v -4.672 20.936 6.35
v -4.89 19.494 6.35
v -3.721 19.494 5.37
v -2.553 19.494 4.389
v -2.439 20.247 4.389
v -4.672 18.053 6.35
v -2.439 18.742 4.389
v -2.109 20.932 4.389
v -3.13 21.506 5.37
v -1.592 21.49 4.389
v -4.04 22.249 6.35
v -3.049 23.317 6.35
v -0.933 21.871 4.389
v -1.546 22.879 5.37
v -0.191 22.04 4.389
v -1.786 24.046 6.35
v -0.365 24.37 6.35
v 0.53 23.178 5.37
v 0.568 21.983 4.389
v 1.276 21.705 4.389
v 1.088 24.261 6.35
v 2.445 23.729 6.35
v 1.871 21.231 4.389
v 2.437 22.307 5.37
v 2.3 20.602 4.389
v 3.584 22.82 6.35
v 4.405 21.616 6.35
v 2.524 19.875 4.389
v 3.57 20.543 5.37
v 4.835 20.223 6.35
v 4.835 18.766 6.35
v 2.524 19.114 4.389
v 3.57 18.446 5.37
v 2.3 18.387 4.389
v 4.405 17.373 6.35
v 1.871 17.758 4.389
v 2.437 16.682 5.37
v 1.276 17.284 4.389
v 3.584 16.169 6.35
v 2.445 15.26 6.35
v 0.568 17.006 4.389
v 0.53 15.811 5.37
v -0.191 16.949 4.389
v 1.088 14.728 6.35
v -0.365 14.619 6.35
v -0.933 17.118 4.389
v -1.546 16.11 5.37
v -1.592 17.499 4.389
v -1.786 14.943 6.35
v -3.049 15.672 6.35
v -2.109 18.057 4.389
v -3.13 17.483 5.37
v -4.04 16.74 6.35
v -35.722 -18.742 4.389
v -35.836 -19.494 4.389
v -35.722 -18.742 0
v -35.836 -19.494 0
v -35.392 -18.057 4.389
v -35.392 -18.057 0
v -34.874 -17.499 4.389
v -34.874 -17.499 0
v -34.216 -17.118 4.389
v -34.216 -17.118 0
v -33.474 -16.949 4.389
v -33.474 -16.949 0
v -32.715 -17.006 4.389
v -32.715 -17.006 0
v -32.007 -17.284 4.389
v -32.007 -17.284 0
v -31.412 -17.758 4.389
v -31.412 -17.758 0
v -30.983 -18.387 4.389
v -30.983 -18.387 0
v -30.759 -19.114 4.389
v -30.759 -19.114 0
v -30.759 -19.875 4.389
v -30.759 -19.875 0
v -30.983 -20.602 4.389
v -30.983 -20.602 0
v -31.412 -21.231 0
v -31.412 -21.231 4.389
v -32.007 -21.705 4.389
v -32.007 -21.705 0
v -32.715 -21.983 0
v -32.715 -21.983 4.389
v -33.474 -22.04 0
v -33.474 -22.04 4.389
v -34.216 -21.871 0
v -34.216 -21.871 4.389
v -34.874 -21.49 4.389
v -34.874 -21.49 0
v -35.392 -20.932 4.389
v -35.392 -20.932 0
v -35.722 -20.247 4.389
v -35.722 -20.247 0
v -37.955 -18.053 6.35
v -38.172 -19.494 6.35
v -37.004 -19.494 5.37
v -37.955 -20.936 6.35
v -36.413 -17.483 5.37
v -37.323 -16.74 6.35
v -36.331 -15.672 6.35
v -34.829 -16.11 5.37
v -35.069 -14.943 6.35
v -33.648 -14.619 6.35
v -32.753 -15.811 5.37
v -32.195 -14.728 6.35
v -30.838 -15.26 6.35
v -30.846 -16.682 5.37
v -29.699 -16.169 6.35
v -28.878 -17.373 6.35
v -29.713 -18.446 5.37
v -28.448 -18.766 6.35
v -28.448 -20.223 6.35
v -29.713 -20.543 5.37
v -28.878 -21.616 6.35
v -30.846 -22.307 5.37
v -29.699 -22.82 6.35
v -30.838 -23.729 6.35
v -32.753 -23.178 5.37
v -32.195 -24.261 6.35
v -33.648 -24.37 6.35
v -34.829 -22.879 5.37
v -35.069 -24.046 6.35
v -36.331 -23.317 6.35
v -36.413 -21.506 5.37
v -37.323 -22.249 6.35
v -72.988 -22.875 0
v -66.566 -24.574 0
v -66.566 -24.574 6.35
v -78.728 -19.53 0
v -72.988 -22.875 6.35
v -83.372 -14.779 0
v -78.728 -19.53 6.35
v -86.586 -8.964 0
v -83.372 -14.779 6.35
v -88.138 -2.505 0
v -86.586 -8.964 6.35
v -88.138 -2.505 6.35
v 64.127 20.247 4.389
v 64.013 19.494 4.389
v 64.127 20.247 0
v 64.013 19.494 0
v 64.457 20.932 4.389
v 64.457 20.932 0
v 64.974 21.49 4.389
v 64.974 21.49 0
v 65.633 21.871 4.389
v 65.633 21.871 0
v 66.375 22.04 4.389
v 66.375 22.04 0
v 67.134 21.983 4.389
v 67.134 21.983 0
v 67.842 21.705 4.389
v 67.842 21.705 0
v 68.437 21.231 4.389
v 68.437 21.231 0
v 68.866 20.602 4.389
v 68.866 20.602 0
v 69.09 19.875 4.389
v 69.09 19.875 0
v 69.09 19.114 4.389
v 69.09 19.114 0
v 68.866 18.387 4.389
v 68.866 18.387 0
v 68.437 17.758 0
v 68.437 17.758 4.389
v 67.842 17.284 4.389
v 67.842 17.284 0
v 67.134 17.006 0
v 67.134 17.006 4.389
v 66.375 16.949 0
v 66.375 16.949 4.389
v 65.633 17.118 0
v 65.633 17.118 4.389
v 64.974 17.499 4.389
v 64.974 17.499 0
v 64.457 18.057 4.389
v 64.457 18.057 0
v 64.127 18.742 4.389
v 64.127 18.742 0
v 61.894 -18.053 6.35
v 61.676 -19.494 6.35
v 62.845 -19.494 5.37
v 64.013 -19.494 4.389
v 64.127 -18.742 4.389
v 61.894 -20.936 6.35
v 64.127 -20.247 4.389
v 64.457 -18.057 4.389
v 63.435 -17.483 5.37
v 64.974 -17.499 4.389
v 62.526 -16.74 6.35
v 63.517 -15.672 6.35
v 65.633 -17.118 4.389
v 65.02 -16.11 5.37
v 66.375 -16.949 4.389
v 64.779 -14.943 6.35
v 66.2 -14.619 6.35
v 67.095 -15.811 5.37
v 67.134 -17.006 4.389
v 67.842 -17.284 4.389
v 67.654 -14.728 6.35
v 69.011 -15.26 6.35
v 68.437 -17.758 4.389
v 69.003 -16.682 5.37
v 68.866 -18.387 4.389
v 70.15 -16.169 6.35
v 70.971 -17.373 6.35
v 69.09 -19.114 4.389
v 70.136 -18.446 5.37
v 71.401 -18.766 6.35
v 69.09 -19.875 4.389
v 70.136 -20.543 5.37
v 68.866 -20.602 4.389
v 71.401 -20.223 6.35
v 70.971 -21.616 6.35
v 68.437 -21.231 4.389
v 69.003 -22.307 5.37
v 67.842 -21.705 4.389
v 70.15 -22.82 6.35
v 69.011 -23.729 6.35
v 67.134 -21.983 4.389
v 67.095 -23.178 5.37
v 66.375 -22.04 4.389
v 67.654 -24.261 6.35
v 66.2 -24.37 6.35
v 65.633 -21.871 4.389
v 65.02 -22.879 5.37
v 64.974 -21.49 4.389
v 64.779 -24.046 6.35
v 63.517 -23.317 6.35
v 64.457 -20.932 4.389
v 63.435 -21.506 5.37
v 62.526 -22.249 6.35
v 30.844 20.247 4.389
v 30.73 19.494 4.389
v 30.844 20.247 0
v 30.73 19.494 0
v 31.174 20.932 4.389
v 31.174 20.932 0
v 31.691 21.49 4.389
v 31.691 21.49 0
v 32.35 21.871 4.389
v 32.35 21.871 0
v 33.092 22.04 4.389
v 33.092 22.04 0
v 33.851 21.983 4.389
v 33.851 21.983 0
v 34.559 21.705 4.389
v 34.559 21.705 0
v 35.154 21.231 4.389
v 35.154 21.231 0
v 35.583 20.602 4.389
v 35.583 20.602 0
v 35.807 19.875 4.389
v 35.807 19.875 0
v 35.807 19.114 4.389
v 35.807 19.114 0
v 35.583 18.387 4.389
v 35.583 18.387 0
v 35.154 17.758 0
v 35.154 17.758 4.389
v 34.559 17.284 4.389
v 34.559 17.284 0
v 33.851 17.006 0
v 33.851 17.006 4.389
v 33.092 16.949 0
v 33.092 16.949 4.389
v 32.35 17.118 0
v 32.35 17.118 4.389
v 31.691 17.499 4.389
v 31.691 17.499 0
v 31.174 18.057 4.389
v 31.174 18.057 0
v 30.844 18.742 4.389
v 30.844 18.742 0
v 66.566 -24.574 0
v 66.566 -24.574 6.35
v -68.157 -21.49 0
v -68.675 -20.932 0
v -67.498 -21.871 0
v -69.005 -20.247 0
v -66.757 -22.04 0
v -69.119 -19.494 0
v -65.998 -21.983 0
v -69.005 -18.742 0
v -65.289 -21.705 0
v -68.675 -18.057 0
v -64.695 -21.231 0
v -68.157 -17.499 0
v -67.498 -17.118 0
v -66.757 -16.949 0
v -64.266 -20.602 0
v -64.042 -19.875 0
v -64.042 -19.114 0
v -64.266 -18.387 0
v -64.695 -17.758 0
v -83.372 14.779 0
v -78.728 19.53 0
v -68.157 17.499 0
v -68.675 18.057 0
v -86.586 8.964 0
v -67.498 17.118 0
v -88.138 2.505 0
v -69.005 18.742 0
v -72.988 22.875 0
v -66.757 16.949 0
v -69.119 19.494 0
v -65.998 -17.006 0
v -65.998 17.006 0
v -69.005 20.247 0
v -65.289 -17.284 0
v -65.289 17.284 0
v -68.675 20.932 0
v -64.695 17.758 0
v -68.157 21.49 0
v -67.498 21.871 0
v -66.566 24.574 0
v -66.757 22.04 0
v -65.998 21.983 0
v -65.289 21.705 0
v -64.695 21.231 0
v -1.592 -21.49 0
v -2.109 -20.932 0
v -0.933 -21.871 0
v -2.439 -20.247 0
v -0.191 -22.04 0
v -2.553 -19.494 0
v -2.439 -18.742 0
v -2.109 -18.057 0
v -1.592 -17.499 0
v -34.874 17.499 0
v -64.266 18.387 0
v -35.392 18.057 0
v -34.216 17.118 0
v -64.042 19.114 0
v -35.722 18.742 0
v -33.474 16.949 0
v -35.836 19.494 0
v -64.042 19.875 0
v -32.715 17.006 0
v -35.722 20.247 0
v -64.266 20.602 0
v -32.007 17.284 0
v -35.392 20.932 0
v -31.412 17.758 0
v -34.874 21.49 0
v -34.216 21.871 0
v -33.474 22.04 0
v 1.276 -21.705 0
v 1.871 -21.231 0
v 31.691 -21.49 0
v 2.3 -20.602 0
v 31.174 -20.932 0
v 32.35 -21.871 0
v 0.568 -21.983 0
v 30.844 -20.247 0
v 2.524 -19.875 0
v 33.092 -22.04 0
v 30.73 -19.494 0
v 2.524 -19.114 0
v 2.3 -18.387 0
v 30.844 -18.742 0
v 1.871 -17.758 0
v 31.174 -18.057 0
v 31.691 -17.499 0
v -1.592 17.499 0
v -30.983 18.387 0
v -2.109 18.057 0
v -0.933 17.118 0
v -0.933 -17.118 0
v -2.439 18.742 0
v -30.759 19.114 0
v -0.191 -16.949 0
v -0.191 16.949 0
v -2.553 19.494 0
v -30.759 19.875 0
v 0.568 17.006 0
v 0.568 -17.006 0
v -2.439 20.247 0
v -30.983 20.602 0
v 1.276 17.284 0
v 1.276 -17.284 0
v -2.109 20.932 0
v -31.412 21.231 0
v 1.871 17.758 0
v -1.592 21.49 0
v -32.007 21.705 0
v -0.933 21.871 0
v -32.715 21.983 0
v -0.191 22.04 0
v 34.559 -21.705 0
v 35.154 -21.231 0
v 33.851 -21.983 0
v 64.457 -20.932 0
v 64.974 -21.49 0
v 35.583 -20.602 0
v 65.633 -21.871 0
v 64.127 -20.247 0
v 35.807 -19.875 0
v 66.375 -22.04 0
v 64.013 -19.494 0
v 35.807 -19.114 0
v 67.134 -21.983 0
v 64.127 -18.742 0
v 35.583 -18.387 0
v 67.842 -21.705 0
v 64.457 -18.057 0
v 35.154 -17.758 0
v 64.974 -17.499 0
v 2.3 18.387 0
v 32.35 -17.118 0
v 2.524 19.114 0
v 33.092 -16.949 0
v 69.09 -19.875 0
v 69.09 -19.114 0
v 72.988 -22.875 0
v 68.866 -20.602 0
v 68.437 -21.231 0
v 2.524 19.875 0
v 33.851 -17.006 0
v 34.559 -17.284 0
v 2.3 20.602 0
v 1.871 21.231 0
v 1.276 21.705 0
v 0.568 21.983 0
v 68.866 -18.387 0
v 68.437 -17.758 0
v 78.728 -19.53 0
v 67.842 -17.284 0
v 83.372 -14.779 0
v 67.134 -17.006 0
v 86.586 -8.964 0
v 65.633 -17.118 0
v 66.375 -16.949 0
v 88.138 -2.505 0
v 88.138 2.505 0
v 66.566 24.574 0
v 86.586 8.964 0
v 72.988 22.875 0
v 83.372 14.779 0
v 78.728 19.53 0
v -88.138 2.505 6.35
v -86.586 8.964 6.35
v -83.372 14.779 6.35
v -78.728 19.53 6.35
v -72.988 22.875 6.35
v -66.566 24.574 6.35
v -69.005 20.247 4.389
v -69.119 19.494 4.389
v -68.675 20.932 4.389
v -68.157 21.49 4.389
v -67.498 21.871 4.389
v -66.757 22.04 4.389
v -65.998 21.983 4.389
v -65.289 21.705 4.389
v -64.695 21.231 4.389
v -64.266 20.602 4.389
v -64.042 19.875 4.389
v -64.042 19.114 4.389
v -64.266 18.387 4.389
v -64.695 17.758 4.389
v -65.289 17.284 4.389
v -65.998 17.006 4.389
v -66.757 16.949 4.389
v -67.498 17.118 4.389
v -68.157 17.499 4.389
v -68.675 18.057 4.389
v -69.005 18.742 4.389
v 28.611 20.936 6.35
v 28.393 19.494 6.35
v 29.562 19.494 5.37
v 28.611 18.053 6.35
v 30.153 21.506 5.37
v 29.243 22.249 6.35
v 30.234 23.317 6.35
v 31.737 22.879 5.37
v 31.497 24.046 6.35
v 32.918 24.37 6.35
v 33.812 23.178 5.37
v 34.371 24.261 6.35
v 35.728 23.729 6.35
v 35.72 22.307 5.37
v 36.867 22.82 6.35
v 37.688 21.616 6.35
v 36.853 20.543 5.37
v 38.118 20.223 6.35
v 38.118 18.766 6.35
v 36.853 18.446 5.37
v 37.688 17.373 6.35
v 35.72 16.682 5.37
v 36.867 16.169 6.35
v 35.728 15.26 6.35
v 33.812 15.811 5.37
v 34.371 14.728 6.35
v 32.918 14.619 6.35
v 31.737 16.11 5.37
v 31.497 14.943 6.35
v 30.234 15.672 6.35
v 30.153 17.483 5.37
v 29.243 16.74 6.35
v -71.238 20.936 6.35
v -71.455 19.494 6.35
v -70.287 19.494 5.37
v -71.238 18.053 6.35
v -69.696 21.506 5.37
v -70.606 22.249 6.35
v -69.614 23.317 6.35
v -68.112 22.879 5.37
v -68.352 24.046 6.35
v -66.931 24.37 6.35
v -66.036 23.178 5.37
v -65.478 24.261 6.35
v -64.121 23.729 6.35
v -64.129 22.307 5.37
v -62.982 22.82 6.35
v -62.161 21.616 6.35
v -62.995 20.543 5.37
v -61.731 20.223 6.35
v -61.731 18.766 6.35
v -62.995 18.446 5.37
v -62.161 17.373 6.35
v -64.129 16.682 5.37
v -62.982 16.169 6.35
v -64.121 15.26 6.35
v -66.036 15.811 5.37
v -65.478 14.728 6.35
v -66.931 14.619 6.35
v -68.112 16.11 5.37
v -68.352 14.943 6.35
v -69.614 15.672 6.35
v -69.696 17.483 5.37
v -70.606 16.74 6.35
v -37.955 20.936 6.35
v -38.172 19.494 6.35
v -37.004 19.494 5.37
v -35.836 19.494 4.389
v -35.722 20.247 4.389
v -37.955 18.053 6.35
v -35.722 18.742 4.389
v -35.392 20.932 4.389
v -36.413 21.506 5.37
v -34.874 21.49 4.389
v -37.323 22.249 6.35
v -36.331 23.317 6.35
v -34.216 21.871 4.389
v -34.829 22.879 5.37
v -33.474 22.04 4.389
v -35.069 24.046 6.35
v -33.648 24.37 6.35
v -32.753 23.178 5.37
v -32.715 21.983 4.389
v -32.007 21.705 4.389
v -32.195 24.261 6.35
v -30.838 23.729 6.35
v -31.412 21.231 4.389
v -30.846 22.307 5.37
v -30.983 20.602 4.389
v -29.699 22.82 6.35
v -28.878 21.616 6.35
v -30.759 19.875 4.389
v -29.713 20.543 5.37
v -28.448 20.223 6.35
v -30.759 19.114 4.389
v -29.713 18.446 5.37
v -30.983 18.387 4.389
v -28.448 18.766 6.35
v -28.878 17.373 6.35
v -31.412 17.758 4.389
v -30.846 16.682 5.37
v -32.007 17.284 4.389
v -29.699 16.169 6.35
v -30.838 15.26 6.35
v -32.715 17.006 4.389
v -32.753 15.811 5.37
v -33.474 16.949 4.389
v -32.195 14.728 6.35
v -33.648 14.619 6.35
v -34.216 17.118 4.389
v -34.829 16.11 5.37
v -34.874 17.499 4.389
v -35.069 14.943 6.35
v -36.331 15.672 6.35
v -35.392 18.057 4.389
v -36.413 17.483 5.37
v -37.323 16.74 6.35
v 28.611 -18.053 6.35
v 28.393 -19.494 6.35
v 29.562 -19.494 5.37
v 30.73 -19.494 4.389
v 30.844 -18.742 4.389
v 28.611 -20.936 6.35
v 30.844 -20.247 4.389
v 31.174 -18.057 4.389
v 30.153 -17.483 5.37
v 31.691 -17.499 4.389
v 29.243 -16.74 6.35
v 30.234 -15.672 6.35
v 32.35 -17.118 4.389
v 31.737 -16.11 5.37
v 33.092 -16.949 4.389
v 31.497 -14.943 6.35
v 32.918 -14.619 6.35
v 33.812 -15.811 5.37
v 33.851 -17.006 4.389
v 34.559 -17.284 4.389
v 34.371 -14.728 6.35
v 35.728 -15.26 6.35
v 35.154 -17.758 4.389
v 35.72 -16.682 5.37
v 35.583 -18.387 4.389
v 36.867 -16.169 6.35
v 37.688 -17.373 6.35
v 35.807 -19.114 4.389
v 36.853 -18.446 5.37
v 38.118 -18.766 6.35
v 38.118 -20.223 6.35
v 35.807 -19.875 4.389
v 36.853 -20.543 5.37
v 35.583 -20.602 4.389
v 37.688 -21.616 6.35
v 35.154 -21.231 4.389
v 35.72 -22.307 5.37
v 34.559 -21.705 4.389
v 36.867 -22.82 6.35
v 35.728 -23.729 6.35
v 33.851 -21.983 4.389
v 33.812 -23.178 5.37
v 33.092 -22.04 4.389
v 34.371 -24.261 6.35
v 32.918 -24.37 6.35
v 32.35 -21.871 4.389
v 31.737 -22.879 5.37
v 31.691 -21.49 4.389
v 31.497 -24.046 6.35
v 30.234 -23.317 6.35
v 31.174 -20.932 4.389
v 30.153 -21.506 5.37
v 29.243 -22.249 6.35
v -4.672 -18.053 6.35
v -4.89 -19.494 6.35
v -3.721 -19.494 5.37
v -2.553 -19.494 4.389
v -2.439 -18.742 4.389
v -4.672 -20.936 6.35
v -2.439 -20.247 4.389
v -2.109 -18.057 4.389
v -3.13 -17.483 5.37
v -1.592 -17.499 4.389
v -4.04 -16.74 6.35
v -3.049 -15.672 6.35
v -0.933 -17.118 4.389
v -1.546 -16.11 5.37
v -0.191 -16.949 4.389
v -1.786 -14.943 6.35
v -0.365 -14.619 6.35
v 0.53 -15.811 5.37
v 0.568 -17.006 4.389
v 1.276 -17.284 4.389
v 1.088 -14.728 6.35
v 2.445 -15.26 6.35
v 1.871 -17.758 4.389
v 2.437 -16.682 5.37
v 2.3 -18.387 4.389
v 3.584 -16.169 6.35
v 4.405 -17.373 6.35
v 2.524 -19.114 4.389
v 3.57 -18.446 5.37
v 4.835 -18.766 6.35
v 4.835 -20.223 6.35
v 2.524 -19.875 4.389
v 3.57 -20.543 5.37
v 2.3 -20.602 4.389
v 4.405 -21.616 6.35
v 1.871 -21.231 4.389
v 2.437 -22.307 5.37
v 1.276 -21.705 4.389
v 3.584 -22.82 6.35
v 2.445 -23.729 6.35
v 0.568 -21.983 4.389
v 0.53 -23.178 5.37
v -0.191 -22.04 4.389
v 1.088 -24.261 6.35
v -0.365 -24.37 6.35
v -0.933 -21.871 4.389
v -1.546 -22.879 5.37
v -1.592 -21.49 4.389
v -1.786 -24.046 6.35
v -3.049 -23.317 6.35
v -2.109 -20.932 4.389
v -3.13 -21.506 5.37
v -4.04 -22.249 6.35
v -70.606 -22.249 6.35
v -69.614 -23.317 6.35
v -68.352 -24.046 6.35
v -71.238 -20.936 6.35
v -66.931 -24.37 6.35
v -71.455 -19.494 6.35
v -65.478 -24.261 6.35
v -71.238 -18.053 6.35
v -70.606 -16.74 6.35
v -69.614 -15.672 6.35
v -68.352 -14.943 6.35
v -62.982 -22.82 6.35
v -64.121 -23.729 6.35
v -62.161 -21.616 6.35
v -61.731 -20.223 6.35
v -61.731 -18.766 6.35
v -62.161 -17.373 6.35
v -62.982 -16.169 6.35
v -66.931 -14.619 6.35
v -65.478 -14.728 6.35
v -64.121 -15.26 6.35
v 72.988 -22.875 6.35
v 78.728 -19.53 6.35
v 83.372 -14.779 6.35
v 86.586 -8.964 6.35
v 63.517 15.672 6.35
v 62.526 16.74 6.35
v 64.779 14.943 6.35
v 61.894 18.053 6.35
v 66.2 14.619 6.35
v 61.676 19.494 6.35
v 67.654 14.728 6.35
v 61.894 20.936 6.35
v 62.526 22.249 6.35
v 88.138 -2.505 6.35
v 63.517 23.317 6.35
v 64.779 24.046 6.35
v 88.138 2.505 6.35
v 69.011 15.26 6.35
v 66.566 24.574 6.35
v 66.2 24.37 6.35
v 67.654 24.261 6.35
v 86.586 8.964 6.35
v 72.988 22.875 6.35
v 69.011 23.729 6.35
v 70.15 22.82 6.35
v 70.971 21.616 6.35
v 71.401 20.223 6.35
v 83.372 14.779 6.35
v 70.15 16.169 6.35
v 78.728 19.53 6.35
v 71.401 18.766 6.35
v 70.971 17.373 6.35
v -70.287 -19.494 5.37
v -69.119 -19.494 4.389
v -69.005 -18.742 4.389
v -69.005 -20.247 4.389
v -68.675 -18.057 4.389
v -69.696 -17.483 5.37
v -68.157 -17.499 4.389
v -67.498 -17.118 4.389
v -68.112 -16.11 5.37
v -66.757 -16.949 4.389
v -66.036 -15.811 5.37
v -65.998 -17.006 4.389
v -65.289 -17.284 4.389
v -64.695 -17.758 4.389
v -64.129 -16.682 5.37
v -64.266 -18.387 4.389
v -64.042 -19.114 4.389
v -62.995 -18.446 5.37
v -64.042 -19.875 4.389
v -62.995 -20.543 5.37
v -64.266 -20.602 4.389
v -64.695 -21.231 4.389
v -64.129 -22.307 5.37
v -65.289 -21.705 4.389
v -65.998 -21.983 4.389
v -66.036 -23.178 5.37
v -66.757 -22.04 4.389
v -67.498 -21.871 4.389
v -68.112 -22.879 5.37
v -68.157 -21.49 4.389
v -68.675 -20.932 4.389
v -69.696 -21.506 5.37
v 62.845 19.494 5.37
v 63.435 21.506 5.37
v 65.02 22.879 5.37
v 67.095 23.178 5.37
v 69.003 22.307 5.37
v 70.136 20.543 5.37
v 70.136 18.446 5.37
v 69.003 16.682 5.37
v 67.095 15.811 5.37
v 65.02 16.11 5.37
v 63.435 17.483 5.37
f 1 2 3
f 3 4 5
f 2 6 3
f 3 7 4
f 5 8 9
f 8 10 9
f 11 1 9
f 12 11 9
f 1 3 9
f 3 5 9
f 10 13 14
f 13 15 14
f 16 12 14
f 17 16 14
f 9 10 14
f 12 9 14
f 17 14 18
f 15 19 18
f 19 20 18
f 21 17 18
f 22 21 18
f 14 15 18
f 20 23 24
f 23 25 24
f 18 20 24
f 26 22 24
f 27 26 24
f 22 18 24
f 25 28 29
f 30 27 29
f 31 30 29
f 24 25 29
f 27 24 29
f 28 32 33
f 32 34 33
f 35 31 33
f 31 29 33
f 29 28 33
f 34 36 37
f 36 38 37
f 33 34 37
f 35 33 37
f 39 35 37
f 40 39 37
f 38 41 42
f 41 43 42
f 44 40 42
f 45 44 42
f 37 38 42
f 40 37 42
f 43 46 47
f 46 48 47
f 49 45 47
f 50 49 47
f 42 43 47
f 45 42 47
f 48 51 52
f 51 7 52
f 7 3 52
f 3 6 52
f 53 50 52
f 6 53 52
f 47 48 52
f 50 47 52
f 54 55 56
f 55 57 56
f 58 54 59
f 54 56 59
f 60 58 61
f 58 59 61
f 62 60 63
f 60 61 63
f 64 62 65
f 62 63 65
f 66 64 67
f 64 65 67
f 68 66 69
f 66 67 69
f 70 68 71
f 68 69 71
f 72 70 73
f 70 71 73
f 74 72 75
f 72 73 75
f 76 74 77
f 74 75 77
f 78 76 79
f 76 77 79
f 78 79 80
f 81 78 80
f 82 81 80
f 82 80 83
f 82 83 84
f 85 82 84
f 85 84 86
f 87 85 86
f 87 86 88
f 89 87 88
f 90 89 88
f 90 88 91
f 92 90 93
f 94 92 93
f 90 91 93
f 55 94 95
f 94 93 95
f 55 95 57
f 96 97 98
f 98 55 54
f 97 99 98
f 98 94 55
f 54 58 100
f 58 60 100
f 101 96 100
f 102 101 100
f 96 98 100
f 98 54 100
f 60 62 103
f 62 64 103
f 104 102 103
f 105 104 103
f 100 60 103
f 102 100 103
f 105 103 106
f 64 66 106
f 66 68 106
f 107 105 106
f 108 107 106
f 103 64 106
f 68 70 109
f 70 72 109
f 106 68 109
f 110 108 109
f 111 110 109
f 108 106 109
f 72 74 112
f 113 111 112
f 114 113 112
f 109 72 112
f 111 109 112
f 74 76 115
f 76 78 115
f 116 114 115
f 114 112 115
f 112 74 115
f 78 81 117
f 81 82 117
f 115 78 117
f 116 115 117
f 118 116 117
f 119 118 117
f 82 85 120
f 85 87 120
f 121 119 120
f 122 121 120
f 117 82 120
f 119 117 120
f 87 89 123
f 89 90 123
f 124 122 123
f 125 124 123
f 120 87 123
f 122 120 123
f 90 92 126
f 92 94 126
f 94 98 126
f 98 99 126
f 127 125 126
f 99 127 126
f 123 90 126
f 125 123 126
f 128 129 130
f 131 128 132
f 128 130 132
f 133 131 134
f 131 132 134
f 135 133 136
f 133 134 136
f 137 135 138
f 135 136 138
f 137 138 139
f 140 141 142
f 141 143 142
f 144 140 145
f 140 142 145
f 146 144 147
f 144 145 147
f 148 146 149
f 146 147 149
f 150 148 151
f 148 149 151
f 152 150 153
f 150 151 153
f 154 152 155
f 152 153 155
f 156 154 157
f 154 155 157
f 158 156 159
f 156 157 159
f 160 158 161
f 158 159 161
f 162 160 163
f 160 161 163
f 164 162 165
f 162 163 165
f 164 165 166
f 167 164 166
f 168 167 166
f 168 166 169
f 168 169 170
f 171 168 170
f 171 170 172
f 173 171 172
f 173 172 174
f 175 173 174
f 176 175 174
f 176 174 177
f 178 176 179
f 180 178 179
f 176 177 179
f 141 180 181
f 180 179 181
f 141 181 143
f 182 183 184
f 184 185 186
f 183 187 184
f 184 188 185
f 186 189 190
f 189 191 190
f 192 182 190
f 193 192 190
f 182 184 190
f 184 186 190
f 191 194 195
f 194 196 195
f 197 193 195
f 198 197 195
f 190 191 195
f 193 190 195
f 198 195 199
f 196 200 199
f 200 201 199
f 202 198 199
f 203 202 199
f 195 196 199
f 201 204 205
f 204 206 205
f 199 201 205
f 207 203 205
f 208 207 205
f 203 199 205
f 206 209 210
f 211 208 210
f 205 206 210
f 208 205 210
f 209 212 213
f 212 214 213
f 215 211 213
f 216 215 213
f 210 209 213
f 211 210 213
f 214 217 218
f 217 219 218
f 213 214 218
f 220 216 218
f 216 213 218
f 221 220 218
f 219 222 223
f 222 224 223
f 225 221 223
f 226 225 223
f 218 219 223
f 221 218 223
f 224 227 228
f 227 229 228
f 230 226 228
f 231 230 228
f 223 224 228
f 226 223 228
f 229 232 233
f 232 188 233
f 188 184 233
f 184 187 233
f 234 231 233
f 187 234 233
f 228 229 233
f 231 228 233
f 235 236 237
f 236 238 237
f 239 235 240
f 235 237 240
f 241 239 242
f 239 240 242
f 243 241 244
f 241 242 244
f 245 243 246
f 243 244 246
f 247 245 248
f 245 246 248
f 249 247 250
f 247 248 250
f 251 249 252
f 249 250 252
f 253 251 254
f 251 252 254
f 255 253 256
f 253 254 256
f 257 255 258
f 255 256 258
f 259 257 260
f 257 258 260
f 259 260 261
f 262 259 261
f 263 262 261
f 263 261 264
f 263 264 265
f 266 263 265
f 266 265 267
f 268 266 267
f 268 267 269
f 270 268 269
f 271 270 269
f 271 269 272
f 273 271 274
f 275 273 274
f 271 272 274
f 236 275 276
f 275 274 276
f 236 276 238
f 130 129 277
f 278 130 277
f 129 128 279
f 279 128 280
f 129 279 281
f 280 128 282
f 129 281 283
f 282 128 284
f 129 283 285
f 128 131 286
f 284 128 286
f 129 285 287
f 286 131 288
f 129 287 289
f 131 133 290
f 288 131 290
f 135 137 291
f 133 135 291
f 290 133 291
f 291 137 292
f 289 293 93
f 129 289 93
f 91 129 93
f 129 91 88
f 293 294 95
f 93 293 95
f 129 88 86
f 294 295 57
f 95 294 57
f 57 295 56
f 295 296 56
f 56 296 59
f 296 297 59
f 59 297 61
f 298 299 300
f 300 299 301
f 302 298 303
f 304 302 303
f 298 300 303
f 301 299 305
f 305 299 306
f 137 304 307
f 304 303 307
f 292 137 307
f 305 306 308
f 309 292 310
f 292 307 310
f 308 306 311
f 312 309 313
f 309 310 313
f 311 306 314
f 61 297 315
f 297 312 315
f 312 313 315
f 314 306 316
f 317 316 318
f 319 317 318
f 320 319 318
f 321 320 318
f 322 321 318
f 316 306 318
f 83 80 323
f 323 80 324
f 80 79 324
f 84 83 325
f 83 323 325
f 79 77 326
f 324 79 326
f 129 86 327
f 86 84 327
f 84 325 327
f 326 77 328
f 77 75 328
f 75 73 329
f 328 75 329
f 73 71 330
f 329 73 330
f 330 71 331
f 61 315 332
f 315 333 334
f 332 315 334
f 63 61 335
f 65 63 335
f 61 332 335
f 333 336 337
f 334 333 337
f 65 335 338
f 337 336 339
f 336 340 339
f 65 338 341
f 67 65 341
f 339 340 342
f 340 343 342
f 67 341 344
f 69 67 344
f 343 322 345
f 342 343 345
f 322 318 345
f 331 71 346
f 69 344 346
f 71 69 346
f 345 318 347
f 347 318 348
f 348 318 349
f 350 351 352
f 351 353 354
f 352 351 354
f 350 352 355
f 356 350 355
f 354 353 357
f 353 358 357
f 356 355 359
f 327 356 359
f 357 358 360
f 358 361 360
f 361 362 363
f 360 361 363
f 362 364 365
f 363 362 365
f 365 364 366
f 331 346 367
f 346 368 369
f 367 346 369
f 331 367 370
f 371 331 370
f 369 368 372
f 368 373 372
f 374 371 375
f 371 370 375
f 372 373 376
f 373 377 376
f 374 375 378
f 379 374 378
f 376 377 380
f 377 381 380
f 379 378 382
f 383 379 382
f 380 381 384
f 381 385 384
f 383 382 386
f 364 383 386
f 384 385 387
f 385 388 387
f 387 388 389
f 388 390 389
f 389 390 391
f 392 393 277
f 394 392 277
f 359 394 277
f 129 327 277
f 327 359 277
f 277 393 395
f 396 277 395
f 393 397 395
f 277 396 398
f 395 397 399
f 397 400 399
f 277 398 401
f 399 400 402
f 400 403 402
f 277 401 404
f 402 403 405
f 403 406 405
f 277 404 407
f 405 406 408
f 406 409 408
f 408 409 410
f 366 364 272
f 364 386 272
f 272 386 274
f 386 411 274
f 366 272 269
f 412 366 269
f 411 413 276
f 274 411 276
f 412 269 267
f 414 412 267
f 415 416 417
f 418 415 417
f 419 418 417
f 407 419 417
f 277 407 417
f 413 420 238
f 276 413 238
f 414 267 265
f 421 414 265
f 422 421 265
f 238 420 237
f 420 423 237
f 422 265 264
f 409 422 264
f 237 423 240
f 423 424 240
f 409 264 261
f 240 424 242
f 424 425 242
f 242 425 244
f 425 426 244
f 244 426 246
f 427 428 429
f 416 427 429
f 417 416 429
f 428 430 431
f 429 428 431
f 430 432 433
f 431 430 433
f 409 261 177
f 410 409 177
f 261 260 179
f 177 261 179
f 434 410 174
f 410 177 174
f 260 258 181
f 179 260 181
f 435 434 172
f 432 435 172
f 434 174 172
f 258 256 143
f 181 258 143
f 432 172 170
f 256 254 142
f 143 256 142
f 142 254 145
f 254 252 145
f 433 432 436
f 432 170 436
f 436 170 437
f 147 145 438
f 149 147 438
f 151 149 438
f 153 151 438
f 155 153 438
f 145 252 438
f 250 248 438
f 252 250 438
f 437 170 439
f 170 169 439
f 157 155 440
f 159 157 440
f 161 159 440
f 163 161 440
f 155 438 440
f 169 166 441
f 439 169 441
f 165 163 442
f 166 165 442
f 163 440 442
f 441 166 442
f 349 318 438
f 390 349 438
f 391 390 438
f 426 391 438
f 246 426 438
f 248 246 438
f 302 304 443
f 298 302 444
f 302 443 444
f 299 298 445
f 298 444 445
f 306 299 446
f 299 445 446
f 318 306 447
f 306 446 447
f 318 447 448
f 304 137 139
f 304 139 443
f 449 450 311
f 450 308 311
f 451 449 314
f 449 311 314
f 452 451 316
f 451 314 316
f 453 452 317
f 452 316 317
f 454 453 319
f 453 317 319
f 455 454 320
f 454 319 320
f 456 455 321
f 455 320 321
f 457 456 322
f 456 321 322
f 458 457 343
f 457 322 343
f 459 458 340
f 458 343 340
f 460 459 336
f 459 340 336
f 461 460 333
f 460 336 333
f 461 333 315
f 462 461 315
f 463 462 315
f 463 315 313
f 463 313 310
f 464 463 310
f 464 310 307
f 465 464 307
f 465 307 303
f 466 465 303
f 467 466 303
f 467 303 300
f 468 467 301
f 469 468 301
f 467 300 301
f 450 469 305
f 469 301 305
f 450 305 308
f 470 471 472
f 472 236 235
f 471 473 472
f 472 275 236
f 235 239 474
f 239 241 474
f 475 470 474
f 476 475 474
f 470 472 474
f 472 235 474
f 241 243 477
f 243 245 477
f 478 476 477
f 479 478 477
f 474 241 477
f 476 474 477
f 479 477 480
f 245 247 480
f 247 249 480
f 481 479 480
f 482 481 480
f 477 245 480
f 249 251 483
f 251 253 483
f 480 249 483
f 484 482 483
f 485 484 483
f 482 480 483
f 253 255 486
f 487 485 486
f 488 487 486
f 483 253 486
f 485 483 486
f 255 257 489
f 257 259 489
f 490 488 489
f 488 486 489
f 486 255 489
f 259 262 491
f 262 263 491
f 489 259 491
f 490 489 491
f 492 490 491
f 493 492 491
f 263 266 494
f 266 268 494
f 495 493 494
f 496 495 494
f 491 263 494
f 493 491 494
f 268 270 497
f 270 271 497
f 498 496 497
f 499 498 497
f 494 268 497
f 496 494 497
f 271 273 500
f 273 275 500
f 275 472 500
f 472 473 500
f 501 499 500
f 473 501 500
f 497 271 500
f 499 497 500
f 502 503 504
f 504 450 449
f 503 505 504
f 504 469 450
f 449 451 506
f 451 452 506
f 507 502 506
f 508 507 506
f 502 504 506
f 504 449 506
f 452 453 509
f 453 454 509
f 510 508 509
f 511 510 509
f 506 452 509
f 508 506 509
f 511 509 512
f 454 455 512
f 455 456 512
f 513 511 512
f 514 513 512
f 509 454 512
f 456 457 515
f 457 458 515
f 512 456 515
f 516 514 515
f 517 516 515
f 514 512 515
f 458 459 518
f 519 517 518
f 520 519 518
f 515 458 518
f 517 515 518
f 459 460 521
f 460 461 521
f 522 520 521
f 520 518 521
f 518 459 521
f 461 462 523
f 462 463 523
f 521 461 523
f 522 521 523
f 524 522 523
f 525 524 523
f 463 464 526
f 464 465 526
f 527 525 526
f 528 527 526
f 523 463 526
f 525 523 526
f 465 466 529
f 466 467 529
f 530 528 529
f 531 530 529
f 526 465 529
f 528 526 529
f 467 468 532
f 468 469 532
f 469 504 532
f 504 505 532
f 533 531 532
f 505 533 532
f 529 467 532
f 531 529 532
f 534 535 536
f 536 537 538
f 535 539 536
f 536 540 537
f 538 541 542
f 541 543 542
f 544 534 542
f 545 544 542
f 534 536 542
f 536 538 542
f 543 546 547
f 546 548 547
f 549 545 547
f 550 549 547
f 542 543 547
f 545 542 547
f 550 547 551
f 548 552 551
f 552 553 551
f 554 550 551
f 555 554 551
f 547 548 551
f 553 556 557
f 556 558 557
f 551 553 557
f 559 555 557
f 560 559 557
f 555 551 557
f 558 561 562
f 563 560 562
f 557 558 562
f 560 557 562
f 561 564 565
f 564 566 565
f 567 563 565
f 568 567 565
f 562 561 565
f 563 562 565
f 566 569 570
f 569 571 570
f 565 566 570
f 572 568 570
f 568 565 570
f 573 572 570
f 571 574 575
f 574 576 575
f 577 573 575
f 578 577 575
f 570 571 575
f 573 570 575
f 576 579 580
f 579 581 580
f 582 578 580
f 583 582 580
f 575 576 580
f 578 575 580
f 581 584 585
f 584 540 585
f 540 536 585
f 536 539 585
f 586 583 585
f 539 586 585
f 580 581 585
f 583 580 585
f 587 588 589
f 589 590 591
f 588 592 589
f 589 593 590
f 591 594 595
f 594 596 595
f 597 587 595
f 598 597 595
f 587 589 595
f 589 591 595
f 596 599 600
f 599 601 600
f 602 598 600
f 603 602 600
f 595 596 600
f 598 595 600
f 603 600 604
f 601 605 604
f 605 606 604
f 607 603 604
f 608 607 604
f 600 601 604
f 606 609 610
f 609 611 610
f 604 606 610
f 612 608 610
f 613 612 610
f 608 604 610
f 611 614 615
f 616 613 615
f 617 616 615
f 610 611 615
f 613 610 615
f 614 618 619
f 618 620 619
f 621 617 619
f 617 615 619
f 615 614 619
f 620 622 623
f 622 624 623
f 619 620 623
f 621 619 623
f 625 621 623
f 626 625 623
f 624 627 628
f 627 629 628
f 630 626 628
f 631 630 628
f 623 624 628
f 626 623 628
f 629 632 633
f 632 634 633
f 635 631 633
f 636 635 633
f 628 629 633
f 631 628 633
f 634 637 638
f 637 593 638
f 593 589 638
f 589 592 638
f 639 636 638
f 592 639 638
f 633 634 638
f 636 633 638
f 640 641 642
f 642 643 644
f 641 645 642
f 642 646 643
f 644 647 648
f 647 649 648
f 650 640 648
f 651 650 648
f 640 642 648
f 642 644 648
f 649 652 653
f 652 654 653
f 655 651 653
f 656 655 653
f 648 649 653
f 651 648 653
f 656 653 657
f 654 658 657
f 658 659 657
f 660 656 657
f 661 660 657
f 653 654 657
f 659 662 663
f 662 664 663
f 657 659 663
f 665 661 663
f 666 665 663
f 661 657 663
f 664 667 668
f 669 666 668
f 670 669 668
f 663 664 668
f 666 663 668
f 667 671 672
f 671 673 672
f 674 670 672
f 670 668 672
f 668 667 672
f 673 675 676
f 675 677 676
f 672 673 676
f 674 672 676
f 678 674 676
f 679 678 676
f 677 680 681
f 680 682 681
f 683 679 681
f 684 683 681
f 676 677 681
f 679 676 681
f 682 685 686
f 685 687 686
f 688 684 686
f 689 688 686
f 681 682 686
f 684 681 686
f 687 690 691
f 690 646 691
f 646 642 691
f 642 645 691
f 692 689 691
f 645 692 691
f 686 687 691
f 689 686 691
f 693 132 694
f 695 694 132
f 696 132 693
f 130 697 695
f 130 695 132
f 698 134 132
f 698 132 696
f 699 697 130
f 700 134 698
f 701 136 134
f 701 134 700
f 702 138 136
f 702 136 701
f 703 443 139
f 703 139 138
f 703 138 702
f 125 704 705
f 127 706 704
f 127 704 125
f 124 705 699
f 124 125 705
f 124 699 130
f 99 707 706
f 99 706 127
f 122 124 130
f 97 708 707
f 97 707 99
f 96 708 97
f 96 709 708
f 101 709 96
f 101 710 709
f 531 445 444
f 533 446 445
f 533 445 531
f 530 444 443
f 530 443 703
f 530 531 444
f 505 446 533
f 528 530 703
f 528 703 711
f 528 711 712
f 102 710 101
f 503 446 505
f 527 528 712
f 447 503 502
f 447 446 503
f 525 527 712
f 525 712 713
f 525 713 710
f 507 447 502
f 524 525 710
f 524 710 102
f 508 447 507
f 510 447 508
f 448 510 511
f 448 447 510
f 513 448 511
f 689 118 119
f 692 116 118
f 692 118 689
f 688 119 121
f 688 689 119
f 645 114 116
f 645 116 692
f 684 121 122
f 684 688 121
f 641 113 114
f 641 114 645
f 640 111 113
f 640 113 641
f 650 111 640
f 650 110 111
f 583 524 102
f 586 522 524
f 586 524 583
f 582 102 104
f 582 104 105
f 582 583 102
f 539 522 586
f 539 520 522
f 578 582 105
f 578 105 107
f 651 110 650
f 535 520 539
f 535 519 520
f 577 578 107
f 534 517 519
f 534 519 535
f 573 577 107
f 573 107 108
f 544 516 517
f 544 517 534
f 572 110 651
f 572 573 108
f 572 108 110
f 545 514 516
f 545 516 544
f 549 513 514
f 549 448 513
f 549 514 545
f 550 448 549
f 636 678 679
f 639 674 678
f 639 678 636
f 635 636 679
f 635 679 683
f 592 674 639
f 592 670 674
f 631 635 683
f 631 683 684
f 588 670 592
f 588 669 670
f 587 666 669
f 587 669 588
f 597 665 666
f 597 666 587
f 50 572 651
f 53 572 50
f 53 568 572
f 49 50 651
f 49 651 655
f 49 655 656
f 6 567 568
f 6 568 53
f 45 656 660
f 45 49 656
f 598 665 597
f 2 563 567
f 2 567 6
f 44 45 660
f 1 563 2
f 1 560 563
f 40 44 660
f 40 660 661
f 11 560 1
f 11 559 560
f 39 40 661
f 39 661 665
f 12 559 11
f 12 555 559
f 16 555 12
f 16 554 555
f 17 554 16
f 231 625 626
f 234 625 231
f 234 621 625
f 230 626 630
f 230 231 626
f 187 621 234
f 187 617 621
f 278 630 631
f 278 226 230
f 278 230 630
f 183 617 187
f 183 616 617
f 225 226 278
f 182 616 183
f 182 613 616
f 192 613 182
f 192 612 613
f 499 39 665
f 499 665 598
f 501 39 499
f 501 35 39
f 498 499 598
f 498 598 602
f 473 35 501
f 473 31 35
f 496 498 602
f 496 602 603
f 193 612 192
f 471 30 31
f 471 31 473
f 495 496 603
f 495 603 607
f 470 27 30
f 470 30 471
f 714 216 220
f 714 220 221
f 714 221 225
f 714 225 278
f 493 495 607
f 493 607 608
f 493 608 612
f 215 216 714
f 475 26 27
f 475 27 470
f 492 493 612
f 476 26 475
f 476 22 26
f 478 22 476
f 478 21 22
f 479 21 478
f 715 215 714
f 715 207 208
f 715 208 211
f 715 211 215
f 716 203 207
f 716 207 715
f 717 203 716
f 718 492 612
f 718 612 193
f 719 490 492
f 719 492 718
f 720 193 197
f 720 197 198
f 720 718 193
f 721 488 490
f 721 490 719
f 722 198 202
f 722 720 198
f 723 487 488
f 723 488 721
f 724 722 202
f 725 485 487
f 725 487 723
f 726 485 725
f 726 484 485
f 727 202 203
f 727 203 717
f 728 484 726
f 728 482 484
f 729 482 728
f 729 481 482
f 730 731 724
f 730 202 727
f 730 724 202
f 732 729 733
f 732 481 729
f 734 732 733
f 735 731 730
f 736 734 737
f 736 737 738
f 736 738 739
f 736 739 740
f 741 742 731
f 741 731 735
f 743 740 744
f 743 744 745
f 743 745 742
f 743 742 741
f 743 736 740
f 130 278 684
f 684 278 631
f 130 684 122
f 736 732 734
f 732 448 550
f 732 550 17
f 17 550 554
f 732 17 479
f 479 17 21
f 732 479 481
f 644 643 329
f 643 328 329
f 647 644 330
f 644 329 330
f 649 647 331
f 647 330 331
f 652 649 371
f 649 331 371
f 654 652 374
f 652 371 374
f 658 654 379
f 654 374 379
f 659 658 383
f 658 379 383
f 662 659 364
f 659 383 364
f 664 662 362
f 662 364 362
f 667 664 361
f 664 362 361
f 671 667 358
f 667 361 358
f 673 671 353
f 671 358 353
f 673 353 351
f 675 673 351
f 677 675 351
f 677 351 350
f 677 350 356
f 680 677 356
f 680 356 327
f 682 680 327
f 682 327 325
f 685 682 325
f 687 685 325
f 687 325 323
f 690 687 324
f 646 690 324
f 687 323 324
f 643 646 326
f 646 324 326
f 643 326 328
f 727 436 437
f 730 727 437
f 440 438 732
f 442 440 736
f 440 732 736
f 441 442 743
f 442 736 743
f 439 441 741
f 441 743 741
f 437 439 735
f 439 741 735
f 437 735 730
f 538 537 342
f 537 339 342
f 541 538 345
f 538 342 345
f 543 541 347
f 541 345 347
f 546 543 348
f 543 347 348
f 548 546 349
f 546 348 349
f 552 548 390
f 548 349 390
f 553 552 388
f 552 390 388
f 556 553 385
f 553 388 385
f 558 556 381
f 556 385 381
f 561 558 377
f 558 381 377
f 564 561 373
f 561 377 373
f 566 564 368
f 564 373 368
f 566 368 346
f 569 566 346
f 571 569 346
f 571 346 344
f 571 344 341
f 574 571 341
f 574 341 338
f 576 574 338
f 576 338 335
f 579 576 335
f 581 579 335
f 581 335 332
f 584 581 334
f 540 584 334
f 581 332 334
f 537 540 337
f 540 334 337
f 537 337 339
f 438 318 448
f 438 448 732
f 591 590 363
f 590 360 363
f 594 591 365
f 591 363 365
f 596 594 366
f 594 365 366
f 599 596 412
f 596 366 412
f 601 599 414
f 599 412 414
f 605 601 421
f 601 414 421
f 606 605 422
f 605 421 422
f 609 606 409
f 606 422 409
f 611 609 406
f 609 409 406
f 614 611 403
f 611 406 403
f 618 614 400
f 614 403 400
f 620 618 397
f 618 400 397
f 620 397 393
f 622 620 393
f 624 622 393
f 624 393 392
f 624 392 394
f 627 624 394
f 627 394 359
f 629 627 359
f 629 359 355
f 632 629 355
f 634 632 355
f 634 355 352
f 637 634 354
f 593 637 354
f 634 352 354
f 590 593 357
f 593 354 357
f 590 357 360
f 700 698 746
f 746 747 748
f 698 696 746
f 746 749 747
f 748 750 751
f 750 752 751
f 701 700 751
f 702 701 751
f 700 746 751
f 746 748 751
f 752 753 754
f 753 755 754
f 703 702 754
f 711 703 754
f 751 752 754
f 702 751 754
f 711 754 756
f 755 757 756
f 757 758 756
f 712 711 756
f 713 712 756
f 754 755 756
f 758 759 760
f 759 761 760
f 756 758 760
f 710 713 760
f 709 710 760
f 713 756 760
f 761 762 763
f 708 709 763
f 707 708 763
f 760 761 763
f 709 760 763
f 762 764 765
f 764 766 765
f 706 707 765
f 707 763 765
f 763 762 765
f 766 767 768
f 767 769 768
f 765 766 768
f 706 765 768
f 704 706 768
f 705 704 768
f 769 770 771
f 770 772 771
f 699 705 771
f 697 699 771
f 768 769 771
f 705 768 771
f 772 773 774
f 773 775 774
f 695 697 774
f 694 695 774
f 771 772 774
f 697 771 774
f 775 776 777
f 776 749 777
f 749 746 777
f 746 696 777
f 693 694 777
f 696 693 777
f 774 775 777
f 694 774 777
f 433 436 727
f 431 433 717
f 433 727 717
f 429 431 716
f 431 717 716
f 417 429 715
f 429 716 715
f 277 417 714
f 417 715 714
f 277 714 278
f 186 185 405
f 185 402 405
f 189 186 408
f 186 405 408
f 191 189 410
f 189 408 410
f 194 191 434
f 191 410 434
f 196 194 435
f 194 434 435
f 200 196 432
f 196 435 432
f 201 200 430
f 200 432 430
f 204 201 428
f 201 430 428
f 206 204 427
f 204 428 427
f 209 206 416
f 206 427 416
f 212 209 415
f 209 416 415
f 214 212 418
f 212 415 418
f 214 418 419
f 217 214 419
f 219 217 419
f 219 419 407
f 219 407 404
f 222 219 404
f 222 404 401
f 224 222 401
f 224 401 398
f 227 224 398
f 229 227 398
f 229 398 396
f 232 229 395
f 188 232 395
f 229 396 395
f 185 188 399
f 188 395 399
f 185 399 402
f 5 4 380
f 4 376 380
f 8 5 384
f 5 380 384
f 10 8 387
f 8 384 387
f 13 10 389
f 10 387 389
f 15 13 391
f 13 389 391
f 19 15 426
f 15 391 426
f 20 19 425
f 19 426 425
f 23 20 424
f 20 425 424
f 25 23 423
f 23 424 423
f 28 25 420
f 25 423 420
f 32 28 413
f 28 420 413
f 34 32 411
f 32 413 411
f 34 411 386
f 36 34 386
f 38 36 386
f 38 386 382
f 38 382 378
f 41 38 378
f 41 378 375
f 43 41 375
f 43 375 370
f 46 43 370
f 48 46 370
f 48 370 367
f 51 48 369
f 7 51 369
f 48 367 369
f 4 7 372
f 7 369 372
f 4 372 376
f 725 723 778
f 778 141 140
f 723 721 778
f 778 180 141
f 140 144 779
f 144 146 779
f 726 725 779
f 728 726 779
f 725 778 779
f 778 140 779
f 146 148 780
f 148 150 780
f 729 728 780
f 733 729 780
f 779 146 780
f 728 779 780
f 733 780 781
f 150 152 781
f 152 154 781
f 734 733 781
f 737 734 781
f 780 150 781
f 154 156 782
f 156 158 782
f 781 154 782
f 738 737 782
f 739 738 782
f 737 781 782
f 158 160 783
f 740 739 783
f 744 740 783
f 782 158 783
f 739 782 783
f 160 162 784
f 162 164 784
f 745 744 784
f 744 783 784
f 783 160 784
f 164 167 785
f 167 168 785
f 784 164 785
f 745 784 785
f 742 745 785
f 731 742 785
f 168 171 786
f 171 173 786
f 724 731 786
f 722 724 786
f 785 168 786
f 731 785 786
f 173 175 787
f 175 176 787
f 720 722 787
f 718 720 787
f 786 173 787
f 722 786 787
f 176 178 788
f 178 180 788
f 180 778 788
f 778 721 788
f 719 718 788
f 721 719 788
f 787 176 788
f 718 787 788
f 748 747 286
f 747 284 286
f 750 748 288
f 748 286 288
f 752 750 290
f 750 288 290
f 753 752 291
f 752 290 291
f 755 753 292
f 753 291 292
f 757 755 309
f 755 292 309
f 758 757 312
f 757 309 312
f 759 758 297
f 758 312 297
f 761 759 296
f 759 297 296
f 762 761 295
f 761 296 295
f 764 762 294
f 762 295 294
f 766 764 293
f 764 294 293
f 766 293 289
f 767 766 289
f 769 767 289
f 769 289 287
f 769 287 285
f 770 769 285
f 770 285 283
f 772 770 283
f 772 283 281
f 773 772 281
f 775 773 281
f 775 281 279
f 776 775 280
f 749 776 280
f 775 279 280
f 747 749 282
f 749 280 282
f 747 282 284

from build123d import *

# Parameters (mm, degrees)
SKETCH1_W                                          = 176.276
SKETCH1_H                                          = 49.149
BOSS_EXTRUDE1_DEPTH                                = 6.35
CUT_EXTRUDE3_DEPTH                                 = 92.719875677
CSK_FOR_10_FLAT_HEAD_MACHINE_SCREW_100_D           = 5.1054
CSK_FOR_10_FLAT_HEAD_MACHINE_SCREW_100_CSINK_D     = 9.779
CSK_FOR_10_FLAT_HEAD_MACHINE_SCREW_100_CSINK_ANGLE = 100


with BuildPart() as part:
    # Sketch1 → Boss-Extrude1 (new body)
    with BuildSketch(Plane.XY):
        Rectangle(SKETCH1_W, SKETCH1_H)
    extrude(amount=BOSS_EXTRUDE1_DEPTH)

    # Sketch22 → Cut-Extrude3 (cut, through all)
    with BuildSketch(Plane.XY.offset(6.35)):
        with BuildLine():
            ThreePointArc((-88.138, 2.504831531), (-81.209963357, 17.310760321), (-66.565807357, 24.5745))
            Line((-66.565807357, 24.5745), (-88.138, 24.5745))
            Line((-88.138, 24.5745), (-88.138, 2.504831531))
        make_face()
        with BuildLine():
            ThreePointArc((-66.565807357, -24.5745), (-81.209963357, -17.310760321), (-88.138, -2.504831531))
            Line((-88.138, -2.504831531), (-88.138, -24.5745))
            Line((-88.138, -24.5745), (-66.565807357, -24.5745))
        make_face()
        with BuildLine():
            Line((88.138, -24.5745), (88.138, -2.504831531))
            ThreePointArc((88.138, -2.504831531), (81.209963357, -17.310760321), (66.565807357, -24.5745))
            Line((66.565807357, -24.5745), (88.138, -24.5745))
        make_face()
        with BuildLine():
            Line((88.138, 24.5745), (66.565807357, 24.5745))
            ThreePointArc((66.565807357, 24.5745), (81.209963357, 17.310760321), (88.138, 2.504831531))
            Line((88.138, 2.504831531), (88.138, 24.5745))
        make_face()
    extrude(amount=-CUT_EXTRUDE3_DEPTH, mode=Mode.SUBTRACT)

    # CSK for #10 Flat Head Machine Screw (100)1 (through all)
    with Locations(Plane.XY.offset(6.35)):
        with Locations((-66.565807357, 19.4945), (-33.282903678, 19.4945), (0, 19.4945), (33.282903678, 19.4945), (66.565807357, 19.4945), (66.565807357, -19.4945), (33.282903678, -19.4945), (0, -19.4945), (-33.282903678, -19.4945), (-66.565807357, -19.4945)):
            CounterSinkHole(CSK_FOR_10_FLAT_HEAD_MACHINE_SCREW_100_D / 2, CSK_FOR_10_FLAT_HEAD_MACHINE_SCREW_100_CSINK_D / 2, counter_sink_angle=CSK_FOR_10_FLAT_HEAD_MACHINE_SCREW_100_CSINK_ANGLE)


solid = part.part
